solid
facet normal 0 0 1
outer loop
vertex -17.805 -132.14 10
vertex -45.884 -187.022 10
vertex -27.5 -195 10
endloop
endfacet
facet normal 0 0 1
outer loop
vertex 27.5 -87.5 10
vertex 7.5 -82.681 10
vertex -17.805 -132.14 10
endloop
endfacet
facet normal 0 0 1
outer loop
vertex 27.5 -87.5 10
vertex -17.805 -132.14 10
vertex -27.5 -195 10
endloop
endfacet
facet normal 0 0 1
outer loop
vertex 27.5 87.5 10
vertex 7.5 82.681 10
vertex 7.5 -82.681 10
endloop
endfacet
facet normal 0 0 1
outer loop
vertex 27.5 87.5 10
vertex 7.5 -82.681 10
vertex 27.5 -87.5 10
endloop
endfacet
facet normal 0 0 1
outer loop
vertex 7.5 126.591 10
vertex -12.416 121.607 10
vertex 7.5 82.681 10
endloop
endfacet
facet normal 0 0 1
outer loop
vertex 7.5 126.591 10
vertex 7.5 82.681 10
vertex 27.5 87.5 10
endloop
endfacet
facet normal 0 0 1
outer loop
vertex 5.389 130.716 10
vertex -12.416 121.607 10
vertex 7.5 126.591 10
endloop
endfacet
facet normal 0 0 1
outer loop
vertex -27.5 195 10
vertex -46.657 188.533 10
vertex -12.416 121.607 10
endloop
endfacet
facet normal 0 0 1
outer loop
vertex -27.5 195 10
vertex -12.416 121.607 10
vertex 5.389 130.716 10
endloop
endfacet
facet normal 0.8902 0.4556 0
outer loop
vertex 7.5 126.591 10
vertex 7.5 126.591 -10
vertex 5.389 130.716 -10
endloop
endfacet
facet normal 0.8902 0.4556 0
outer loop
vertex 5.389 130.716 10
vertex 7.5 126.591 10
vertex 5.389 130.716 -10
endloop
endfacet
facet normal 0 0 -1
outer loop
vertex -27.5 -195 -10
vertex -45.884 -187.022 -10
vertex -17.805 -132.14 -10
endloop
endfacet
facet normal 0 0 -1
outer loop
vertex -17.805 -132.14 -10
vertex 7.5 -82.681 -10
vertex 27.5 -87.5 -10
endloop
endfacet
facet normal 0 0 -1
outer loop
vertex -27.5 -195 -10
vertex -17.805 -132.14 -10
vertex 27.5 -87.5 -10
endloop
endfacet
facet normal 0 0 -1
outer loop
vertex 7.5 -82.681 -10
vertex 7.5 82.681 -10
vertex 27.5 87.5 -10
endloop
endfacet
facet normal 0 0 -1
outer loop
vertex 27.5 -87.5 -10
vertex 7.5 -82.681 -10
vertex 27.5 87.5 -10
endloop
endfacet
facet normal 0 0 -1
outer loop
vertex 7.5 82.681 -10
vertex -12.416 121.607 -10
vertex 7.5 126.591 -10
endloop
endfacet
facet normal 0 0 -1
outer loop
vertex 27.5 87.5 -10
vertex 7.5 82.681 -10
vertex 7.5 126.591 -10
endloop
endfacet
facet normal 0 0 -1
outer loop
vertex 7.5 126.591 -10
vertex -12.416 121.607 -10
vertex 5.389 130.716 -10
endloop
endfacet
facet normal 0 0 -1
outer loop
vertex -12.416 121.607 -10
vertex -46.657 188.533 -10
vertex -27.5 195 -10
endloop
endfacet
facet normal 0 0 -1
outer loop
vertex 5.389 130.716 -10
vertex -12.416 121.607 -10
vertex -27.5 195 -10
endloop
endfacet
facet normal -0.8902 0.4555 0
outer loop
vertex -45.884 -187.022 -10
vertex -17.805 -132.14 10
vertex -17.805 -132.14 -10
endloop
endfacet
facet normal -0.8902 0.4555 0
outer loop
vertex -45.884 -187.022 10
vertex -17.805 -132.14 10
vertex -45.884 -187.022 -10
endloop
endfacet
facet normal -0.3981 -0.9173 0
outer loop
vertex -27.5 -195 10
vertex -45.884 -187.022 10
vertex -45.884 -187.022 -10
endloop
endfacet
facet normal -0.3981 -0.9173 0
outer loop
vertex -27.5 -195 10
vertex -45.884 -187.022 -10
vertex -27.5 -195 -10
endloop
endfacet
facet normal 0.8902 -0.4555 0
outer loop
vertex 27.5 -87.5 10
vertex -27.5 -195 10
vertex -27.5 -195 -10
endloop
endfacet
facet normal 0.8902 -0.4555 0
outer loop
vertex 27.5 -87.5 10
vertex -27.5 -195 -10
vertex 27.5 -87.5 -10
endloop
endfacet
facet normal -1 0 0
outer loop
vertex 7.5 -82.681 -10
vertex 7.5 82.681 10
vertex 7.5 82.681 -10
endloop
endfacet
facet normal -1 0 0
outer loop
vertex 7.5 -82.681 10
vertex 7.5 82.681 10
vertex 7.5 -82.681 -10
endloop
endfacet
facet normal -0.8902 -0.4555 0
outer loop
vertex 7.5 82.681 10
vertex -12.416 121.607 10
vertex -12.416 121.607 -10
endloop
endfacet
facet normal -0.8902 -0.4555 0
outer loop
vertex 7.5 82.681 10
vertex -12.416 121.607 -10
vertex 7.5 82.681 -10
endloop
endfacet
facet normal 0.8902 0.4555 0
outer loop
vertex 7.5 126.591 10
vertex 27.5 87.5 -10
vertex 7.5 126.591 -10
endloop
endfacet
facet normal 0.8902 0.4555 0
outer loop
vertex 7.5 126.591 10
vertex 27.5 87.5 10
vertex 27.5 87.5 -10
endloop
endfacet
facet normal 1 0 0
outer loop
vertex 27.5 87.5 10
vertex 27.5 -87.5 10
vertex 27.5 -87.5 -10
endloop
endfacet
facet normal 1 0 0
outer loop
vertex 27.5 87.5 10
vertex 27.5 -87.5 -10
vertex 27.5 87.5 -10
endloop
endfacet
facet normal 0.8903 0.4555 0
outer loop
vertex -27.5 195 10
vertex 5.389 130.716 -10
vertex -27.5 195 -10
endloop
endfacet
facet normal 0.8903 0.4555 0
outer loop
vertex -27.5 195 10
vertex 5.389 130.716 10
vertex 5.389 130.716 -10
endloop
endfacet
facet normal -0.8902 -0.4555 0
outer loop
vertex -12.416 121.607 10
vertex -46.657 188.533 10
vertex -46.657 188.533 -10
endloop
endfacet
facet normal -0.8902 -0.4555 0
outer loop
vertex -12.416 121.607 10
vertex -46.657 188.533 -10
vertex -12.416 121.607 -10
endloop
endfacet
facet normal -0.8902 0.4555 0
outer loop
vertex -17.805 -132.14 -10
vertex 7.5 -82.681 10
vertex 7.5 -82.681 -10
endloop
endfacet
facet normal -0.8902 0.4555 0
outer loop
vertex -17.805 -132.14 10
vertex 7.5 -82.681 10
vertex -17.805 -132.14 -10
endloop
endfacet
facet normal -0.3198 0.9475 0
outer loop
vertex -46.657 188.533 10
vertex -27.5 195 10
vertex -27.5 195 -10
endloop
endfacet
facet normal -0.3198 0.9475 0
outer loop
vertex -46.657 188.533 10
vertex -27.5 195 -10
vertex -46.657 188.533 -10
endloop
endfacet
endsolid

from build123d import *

# Parameters (mm, degrees)
F1_DEPTH = 10


with BuildPart() as f1:
    # F0 (on Top) → F1 (new body, symmetric)
    with BuildSketch(Plane.XY):
        Polygon((-12.415687, 121.606898), (5.389277, 130.716414), (-27.5, 195), (-46.656741, 188.532595), align=None)
        Polygon((7.5, 82.680783), (7.5, 126.590909), (5.389277, 130.716414), (-12.415687, 121.606898), align=None)
        Polygon((7.5, 0), (27.5, 0), (27.5, 87.5), (7.5, 126.590909), (7.5, 82.680783), align=None)
        Polygon((27.5, -87.5), (27.5, 0), (7.5, 0), (7.5, -82.680783), (-17.804963, -132.140484), (0, -141.25), align=None)
        Polygon((-27.5, -195), (0, -141.25), (-17.804963, -132.140484), (-45.884107, -187.022447), align=None)
    extrude(amount=F1_DEPTH, both=True)


solid = f1.part
